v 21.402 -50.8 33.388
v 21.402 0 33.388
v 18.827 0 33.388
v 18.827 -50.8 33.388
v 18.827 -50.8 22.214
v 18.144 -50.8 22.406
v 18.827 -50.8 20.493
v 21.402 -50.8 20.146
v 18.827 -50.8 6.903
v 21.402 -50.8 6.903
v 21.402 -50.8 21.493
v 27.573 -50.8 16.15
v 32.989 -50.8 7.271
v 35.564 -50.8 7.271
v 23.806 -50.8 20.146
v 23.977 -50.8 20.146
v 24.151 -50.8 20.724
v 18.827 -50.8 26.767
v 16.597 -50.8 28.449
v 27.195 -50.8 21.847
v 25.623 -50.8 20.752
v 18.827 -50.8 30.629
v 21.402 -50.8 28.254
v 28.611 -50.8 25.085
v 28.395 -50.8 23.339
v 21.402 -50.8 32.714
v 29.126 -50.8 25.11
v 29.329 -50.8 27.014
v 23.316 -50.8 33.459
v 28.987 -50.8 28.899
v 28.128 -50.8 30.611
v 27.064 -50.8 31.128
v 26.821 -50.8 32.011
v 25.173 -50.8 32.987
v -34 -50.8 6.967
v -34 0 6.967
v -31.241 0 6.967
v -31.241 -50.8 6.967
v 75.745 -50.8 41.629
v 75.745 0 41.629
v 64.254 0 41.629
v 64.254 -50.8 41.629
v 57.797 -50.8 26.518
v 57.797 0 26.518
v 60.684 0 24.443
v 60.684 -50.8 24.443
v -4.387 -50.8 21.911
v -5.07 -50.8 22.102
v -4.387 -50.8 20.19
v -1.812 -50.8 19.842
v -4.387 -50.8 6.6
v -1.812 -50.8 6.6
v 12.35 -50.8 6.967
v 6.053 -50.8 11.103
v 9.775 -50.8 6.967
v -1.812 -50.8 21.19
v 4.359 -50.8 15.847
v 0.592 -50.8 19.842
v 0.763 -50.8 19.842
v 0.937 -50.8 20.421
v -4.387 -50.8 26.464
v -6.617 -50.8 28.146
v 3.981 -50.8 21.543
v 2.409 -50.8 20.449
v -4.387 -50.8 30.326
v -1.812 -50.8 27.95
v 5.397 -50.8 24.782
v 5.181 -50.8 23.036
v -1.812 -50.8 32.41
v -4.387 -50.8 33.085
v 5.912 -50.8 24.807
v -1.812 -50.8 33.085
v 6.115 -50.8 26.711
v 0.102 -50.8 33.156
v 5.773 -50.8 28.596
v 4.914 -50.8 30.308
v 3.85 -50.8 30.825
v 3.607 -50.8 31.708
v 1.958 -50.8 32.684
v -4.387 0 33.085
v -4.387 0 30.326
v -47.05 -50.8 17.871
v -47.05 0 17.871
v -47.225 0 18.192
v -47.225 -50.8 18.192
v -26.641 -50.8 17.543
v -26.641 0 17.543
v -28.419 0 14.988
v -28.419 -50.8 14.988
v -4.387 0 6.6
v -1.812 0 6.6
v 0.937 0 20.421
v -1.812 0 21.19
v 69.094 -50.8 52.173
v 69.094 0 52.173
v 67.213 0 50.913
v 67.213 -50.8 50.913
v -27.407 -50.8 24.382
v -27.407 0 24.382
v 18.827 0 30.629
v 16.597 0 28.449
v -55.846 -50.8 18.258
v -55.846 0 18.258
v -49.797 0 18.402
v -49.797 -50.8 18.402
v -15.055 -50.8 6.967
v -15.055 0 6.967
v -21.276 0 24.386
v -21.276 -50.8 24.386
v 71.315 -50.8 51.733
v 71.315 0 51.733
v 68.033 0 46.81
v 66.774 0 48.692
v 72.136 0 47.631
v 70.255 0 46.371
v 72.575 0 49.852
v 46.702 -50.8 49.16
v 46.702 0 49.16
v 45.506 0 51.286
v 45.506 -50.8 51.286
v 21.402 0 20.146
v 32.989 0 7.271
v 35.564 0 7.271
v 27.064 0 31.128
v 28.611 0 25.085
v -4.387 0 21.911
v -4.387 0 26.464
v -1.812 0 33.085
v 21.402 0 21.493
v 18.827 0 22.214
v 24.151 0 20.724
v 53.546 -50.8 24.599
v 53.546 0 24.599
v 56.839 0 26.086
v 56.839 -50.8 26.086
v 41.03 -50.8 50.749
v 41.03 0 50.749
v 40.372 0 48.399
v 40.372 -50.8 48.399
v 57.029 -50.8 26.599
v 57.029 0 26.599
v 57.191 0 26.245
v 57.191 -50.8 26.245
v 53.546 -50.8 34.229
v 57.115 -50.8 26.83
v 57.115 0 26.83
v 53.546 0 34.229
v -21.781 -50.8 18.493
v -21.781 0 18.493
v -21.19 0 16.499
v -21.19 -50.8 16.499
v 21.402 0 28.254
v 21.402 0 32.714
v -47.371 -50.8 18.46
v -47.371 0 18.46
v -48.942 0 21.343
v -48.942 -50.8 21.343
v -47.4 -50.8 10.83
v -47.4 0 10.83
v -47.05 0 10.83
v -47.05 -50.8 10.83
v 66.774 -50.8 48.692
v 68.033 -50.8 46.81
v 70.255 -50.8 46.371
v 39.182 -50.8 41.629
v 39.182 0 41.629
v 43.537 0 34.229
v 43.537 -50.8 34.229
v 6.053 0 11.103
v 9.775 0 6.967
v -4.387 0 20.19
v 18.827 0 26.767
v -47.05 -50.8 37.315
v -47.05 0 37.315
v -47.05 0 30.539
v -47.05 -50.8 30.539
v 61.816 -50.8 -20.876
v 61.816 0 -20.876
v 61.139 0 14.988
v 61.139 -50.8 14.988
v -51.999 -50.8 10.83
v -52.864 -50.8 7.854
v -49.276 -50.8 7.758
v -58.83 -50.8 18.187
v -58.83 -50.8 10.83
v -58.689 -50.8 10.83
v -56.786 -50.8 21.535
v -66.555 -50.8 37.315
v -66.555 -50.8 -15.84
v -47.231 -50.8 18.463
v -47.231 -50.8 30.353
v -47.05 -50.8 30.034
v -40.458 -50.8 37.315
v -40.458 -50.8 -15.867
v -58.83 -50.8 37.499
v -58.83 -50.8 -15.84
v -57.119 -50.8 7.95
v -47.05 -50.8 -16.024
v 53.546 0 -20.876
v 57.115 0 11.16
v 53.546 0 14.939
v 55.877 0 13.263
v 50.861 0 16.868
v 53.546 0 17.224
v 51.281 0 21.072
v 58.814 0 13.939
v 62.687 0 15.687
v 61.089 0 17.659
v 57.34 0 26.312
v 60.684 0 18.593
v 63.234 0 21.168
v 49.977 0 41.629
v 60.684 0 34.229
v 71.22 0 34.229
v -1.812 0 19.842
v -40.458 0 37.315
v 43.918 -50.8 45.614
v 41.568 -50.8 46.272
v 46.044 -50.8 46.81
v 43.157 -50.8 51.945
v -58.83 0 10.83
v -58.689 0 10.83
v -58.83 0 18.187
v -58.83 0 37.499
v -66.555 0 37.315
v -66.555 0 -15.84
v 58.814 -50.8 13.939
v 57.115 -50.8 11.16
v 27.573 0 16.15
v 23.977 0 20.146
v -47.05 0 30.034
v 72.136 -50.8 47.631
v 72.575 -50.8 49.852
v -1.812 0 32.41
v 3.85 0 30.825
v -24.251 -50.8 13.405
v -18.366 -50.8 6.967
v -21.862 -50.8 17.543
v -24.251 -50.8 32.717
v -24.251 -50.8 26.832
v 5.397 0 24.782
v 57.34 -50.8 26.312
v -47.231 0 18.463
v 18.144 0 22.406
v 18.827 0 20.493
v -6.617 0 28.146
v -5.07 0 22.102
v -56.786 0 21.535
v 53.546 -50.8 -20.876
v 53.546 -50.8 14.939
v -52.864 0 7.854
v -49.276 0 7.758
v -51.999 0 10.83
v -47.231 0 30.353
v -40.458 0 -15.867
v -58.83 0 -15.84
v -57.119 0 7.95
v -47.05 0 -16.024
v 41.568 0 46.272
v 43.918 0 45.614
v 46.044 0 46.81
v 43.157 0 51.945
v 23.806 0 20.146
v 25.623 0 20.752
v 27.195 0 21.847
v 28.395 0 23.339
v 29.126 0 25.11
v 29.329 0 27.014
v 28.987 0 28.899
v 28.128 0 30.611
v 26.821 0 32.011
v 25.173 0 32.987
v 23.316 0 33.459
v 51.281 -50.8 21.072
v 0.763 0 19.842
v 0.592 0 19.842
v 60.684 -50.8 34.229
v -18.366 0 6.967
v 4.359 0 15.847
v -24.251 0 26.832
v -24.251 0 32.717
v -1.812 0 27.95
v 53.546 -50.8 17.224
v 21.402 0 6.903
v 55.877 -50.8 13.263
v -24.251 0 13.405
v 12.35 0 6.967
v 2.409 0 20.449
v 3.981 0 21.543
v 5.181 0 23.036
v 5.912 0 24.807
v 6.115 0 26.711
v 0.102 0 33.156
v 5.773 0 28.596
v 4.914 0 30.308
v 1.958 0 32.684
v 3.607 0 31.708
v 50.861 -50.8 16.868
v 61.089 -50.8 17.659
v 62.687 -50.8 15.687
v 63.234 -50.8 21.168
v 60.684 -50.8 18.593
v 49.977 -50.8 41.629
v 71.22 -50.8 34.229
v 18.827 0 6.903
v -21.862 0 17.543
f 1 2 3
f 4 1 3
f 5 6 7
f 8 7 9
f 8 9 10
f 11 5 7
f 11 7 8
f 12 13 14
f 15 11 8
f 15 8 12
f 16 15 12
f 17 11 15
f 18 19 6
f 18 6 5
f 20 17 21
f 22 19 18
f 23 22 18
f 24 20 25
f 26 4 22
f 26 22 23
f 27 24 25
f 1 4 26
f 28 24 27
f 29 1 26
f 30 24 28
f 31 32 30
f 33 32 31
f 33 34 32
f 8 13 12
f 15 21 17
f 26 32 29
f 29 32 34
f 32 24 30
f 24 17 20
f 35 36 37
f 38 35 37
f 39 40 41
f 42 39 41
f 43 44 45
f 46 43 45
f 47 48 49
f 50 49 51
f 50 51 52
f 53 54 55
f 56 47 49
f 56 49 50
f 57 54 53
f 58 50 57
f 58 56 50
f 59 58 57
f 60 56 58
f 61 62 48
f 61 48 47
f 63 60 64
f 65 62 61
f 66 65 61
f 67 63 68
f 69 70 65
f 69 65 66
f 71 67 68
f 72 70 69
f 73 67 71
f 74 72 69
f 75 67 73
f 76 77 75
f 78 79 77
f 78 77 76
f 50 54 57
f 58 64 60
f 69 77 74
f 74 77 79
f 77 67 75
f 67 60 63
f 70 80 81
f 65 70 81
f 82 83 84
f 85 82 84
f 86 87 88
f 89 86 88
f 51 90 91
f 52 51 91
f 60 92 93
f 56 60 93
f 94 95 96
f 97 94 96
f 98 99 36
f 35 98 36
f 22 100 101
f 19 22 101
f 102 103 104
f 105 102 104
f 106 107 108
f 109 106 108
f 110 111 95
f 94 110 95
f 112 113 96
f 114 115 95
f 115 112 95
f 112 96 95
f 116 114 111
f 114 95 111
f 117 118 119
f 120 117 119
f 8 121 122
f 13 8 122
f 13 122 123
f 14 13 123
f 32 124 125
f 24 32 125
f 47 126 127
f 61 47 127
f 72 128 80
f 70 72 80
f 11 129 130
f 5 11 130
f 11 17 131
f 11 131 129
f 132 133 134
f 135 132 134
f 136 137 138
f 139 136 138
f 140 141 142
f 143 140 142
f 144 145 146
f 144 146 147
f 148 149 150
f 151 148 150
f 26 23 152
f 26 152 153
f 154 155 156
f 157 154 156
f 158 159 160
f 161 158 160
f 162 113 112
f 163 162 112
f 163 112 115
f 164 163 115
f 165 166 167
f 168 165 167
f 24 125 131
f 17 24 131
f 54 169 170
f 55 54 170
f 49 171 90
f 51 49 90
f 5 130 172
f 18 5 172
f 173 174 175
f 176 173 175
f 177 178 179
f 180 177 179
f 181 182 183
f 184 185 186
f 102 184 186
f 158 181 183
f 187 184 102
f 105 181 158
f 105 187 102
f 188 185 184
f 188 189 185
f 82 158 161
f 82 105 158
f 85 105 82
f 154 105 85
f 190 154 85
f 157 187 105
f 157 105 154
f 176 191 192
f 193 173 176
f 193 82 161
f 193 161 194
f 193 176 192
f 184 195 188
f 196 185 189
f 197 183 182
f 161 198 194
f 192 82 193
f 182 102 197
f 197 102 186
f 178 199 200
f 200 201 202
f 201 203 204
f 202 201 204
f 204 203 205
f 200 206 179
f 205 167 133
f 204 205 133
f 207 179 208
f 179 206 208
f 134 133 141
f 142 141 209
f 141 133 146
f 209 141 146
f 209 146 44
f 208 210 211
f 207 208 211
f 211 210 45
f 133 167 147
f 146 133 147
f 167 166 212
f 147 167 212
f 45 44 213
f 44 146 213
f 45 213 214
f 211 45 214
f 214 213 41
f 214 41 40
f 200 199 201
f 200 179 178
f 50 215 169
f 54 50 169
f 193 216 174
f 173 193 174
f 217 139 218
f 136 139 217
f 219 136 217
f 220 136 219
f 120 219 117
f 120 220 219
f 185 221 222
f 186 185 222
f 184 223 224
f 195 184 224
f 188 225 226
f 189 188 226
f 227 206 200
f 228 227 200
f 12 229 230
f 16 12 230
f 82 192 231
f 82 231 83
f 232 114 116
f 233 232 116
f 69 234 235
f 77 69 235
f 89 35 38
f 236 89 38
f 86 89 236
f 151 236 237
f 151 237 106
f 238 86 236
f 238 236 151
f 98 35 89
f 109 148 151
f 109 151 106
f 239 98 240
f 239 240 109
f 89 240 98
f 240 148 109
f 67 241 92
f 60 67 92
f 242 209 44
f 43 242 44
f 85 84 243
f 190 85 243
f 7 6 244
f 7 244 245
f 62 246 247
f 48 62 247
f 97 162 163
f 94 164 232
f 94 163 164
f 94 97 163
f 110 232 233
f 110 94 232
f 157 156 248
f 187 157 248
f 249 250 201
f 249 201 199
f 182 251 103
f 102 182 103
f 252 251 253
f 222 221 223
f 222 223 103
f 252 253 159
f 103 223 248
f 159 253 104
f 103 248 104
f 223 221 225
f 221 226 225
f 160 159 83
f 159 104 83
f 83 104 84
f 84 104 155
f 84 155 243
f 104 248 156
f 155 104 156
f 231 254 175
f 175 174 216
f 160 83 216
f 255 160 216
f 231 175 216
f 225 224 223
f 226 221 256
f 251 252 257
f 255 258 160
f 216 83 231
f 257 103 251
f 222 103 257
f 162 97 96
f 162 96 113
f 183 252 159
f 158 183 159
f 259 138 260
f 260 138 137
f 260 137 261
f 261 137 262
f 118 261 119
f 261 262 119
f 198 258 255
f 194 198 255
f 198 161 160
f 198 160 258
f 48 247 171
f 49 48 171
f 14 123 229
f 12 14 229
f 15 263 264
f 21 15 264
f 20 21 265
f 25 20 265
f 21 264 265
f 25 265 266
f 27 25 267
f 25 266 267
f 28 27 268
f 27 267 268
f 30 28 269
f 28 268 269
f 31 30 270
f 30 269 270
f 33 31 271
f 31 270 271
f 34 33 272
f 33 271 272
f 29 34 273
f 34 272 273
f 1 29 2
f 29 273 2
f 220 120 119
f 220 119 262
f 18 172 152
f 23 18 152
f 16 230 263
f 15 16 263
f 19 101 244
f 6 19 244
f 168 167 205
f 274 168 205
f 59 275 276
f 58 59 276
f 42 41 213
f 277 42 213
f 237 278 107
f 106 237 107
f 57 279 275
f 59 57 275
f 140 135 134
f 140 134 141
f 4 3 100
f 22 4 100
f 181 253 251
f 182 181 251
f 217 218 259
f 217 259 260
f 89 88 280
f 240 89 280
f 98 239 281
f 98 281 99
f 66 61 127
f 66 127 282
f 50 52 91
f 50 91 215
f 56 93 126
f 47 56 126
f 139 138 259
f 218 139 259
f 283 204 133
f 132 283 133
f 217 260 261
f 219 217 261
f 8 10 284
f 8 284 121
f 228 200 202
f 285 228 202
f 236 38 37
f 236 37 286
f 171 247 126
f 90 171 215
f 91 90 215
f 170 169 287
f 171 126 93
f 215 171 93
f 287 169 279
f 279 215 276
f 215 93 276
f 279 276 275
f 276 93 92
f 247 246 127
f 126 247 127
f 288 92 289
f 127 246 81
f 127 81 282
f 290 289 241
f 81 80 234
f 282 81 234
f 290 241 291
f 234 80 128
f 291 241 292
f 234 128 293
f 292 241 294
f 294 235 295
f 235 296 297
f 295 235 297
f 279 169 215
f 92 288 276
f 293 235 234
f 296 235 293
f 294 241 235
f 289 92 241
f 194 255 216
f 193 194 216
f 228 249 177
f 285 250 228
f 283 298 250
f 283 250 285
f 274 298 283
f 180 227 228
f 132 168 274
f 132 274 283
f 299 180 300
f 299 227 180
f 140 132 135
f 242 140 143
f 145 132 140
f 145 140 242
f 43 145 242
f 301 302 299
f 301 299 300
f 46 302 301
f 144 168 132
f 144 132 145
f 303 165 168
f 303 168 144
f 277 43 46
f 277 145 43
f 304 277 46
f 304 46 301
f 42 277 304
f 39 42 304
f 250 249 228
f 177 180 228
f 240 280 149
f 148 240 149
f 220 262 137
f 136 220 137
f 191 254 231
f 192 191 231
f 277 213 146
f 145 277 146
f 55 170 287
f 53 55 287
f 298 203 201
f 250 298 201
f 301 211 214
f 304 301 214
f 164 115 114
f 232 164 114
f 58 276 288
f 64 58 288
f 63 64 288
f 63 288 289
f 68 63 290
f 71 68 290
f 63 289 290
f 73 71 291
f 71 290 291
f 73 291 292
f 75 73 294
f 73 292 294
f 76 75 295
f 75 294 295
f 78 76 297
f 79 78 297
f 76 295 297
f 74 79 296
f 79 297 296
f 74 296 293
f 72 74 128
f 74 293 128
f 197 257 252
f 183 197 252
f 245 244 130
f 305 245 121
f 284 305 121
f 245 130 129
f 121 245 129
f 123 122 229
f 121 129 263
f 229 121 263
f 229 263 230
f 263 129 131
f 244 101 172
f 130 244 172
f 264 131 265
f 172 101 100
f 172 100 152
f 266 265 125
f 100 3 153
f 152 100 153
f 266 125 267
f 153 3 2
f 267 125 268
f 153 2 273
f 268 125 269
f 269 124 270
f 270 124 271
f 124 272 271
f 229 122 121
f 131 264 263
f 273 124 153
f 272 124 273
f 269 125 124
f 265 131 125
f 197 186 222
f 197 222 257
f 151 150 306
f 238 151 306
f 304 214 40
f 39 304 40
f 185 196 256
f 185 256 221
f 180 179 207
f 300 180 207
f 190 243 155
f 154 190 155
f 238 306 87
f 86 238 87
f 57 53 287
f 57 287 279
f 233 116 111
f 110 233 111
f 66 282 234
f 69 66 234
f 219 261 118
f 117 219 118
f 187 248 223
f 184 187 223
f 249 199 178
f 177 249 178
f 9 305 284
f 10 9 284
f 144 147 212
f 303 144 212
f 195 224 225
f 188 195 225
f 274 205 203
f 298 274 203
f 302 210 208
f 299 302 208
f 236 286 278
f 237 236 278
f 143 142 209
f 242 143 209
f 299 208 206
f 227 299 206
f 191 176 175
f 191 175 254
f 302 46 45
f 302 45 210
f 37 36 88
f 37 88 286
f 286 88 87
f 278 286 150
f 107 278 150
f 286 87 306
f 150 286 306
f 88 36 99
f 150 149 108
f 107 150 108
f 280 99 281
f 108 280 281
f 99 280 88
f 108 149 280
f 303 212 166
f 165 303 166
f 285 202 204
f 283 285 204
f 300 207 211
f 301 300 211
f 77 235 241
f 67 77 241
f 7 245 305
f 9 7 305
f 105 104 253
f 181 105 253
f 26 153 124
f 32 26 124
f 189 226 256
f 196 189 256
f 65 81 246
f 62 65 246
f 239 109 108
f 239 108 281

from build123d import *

# Parameters (mm, degrees)
F1_DEPTH = 50.8


with BuildPart() as f1:
    # F0 (on Front) → F1 (new body)
    with BuildSketch(Plane.XZ):
        Polygon((-58.8298365474, 29.786439916), (-66.5548071265, 37.3154692352), (-66.5548071265, 18.4631307041), align=None)
        Polygon((-58.8298365474, 37.4993979931), (-66.5548071265, 37.3154692352), (-58.8298365474, 29.786439916), align=None)
        Polygon((-58.8298365474, 10.8298631385), (-66.5548071265, 18.4631307041), (-66.5548071265, 3.0120878626), align=None)
        Polygon((-58.8298365474, 29.786439916), (-66.5548071265, 18.4631307041), (-58.8298365474, 10.8298631385), (-58.8298365474, 11.0889577304), (-60.8739337508, 14.8388091705), (-58.8298365474, 18.1869771332), align=None)
        Polygon((-58.8298365474, -6.2754247338), (-66.5548071265, 3.0120878626), (-66.5548071265, -15.8396717161), align=None)
        Polygon((-58.8298365474, 10.8298631385), (-66.5548071265, 3.0120878626), (-58.8298365474, -6.2754247338), align=None)
        Polygon((-58.8298365474, 11.0889577304), (-58.8298365474, 10.8298631385), (-58.6886004107, 10.8298631385), align=None)
        Polygon((-55.8463617032, 18.2580125911), (-58.8298365474, 18.1869771332), (-58.8298365474, 11.0889577304), (-58.6886004107, 10.8298631385), (-53.7171107503, 10.8298631385), align=None)
        Polygon((-56.785739344, 21.5351450958), (-58.8298365474, 18.1869771332), (-55.8463617032, 18.2580125911), align=None)
        Polygon((-58.8298365474, 11.0889577304), (-58.8298365474, 18.1869771332), (-60.8739337508, 14.8388091705), align=None)
        Polygon((-58.8298365474, -6.2754247338), (-66.5548071265, -15.8396717161), (-58.8298365474, -15.8396717161), align=None)
        Polygon((-53.7171107503, 10.8298631385), (-58.6886004107, 10.8298631385), (-57.1188339306, 7.9501609961), (-49.2755397037, 7.7578487468), (-47.4000376092, 10.8298631385), (-51.9989120974, 10.8298631385), (-52.8640922305, 7.8540048714), align=None)
        Polygon((-56.785739344, 21.5351450958), (-55.8463617032, 18.2580125911), (-49.7974319066, 18.4020354236), (-48.9424451171, 21.3428328465), align=None)
        Polygon((-48.9424451171, 21.3428328465), (-49.7974319066, 18.4020354236), (-47.3708690241, 18.4598110089), align=None)
        Polygon((-47.3708690241, 18.4598110089), (-49.7974319066, 18.4020354236), (-51.9989120974, 10.8298631385), (-47.4000376092, 10.8298631385), (-47.0628473915, 11.3821702804), (-47.2249917962, 18.1922024371), align=None)
        Polygon((-47.2314425003, 18.4631307041), (-47.3708690241, 18.4598110089), (-47.2249917962, 18.1922024371), align=None)
        Polygon((-47.0628473915, 11.3821702804), (-47.4000376092, 10.8298631385), (-47.049697158, 10.8298631385), align=None)
        Polygon((-47.049697158, 17.8706282721), (-47.2249917962, 18.1922024371), (-47.0628473915, 11.3821702804), (-47.049697158, 11.4037099558), align=None)
        Polygon((-40.4583076052, 5.1381438499), (-47.049697158, 10.8298631385), (-47.049697158, -5.723641254), align=None)
        Polygon((-47.0628473915, 11.3821702804), (-47.049697158, 10.8298631385), (-47.049697158, 11.4037099558), align=None)
        Polygon((-47.049697158, 11.4037099558), (-47.049697158, 10.8298631385), (-40.4583076052, 18.4631307041), (-47.049697158, 30.0335602085), (-47.049697158, 17.8706282721), (-45.187345297, 14.454184672), align=None)
        Polygon((-40.4583076052, 18.4631307041), (-47.049697158, 10.8298631385), (-40.4583076052, 5.1381438499), align=None)
        Polygon((-45.187345297, 14.454184672), (-47.049697158, 17.8706282721), (-47.049697158, 11.4037099558), align=None)
        Polygon((-40.4583076052, -15.866660008), (-47.049697158, -5.723641254), (-47.049697158, -16.0235986114), align=None)
        Polygon((-40.4583076052, 5.1381438499), (-47.049697158, -5.723641254), (-40.4583076052, -15.866660008), align=None)
        Polygon((-47.049697158, 30.0335602085), (-40.4583076052, 18.4631307041), (-40.4583076052, 37.3154692352), (-47.049697158, 30.5394300565), align=None)
        Polygon((-47.2314425003, 30.3525933432), (-47.049697158, 30.0335602085), (-47.049697158, 30.5394300565), align=None)
        Polygon((-47.049697158, 30.5394300565), (-40.4583076052, 37.3154692352), (-47.049697158, 37.3154692352), align=None)
    extrude(amount=F1_DEPTH)


with BuildPart() as f1b:
    # F0 (on Front) → F1, piece 2 (new body)
    with BuildSketch(Plane.XZ):
        Polygon((-24.2514032871, 26.8315859139), (-24.2514032871, 32.7172726393), (-27.4069766335, 24.3817956818), align=None)
        Polygon((-21.2761012771, 24.3864267705), (-24.2514032871, 32.7172726393), (-24.2514032871, 26.8315859139), align=None)
        Polygon((-26.852971582, 19.437654277), (-27.4069766335, 24.3817956818), (-33.9995771646, 6.9673787802), (-28.4185056166, 14.9882413403), align=None)
        Polygon((-24.2514032871, 26.8315859139), (-27.4069766335, 24.3817956818), (-26.852971582, 19.437654277), align=None)
        Polygon((-21.7807631904, 18.4931748057), (-21.2761012771, 24.3864267705), (-24.2514032871, 26.8315859139), align=None)
        Polygon((-15.0550128892, 6.9673787802), (-21.2761012771, 24.3864267705), (-21.7807631904, 18.4931748057), (-21.189810511, 16.4987093259), align=None)
        Polygon((-28.4185056166, 14.9882413403), (-33.9995771646, 6.9673787802), (-31.2406606972, 6.9673787802), align=None)
        Polygon((-18.3657128364, 6.9673787802), (-15.0550128892, 6.9673787802), (-21.189810511, 16.4987093259), align=None)
        Polygon((-28.4185056166, 14.9882413403), (-31.2406606972, 6.9673787802), (-24.2514032871, 13.4048527107), (-26.6406958413, 17.5432288088), align=None)
        Polygon((-21.8621107328, 17.5432288088), (-26.6406958413, 17.5432288088), (-24.2514032871, 13.4048527107), align=None)
        Polygon((-24.2514032871, 13.4048527107), (-18.3657128364, 6.9673787802), (-21.189810511, 16.4987093259), (-21.8621107328, 17.5432288088), align=None)
    extrude(amount=F1_DEPTH)


with BuildPart() as f1c:
    # F0 (on Front) → F1, piece 3 (new body)
    with BuildSketch(Plane.XZ):
        Polygon((-1.8122101901, 33.0851301551), (-4.3871989474, 33.0851301551), (-4.3871989474, 30.326211825), (-2.1571931011, 32.5069151583), (-1.8122101901, 32.4103317998), align=None)
        Polygon((-2.1571931011, 32.5069151583), (-4.3871989474, 30.326211825), (-4.3871989474, 26.4637283981), (-1.8122101901, 27.9503988502), (-1.8122101901, 32.4103317998), align=None)
        Polygon((-4.3871989474, 26.4637283981), (-4.3871989474, 30.326211825), (-6.6172047936, 28.1455084917), (-5.0701216704, 22.1023217315), (-4.3871989474, 21.91112684), align=None)
        with BuildLine():
            ThreePointArc((0.5919902344, 19.8423266411), (6.0112917792, 27.6658286104), (-1.8122101901, 33.0851301551))
            Line((-1.8122101901, 33.0851301551), (-1.8122101901, 32.4103317998))
            Line((-1.8122101901, 32.4103317998), (3.8499017147, 30.8251350647))
            Line((3.8499017147, 30.8251350647), (5.396984838, 24.7819483045))
            Line((5.396984838, 24.7819483045), (0.9369731454, 20.4205416378))
            Line((0.9369731454, 20.4205416378), (-1.8122101901, 21.1902184865))
            Line((-1.8122101901, 21.1902184865), (-1.8122101901, 19.8423266411))
            Line((-1.8122101901, 19.8423266411), (0.5919902344, 19.8423266411))
        make_face()
        with BuildLine():
            Line((0.7627803134, 19.8423266411), (0.5919902344, 19.8423266411))
            ThreePointArc((0.5919902344, 19.8423266411), (-0.6101099778, 19.7340919928), (-1.8122101901, 19.8423266411))
            Line((-1.8122101901, 19.8423266411), (4.3589192338, 15.8466170106))
            Line((4.3589192338, 15.8466170106), (0.7627803134, 19.8423266411))
        make_face()
        with BuildLine():
            ThreePointArc((-1.8122101901, 19.8423266411), (-0.6101099778, 19.7340919928), (0.5919902344, 19.8423266411))
            Line((0.5919902344, 19.8423266411), (-1.8122101901, 19.8423266411))
        make_face()
        Polygon((-1.8122101901, 21.1902184865), (-4.3871989474, 21.91112684), (-4.3871989474, 20.1901380517), (-1.8122101901, 12.9801693227), (-1.8122101901, 19.8423266411), align=None)
        Polygon((-4.3871989474, 20.1901380517), (-4.3871989474, 21.91112684), (-5.0701216704, 22.1023217315), align=None)
        Polygon((4.3589192338, 15.8466170106), (-1.8122101901, 19.8423266411), (6.0529916546, 11.1032140948), align=None)
        Polygon((-1.8122101901, 12.9801693227), (-4.3871989474, 20.1901380517), (-4.3871989474, 6.5995231271), align=None)
        Polygon((-1.8122101901, 6.5995231271), (-1.8122101901, 12.9801693227), (-4.3871989474, 6.5995231271), align=None)
        Polygon((12.350234203, 6.9673787802), (6.0529916546, 11.1032140948), (9.7752436996, 6.9673787802), align=None)
        Polygon((4.3589192338, 15.8466170106), (6.0529916546, 11.1032140948), (12.350234203, 6.9673787802), align=None)
    extrude(amount=F1_DEPTH)


with BuildPart() as f1d:
    # F0 (on Front) → F1, piece 4 (new body)
    with BuildSketch(Plane.XZ):
        Polygon((21.4019286279, 33.388309678), (18.8269398706, 33.388309678), (18.8269398706, 30.6293913479), (21.0569457169, 32.8100946813), (21.4019286279, 32.7135113227), align=None)
        Polygon((21.0569457169, 32.8100946813), (18.8269398706, 30.6293913479), (18.8269398706, 26.766907921), (21.4019286279, 28.2535783732), (21.4019286279, 32.7135113227), align=None)
        Polygon((18.8269398706, 26.766907921), (18.8269398706, 30.6293913479), (16.5969340243, 28.4486880146), (18.1440171476, 22.4055012544), (18.8269398706, 22.214306363), align=None)
        with BuildLine():
            ThreePointArc((23.8061290524, 20.145506164), (29.2254305972, 27.9690081333), (21.4019286279, 33.388309678))
            Line((21.4019286279, 33.388309678), (21.4019286279, 32.7135113227))
            Line((21.4019286279, 32.7135113227), (27.0640405327, 31.1283145876))
            Line((27.0640405327, 31.1283145876), (28.611123656, 25.0851278274))
            Line((28.611123656, 25.0851278274), (24.1511119634, 20.7237211608))
            Line((24.1511119634, 20.7237211608), (21.4019286279, 21.4933980094))
            Line((21.4019286279, 21.4933980094), (21.4019286279, 20.145506164))
            Line((21.4019286279, 20.145506164), (23.8061290524, 20.145506164))
        make_face()
        with BuildLine():
            Line((23.9769191314, 20.145506164), (23.8061290524, 20.145506164))
            ThreePointArc((23.8061290524, 20.145506164), (22.6040288402, 20.0372715157), (21.4019286279, 20.145506164))
            Line((21.4019286279, 20.145506164), (27.5730580518, 16.1497965335))
            Line((27.5730580518, 16.1497965335), (23.9769191314, 20.145506164))
        make_face()
        with BuildLine():
            ThreePointArc((21.4019286279, 20.145506164), (22.6040288402, 20.0372715157), (23.8061290524, 20.145506164))
            Line((23.8061290524, 20.145506164), (21.4019286279, 20.145506164))
        make_face()
        Polygon((21.4019286279, 21.4933980094), (18.8269398706, 22.214306363), (18.8269398706, 20.4933175746), (21.4019286279, 13.2833488456), (21.4019286279, 20.145506164), align=None)
        Polygon((18.8269398706, 20.4933175746), (18.8269398706, 22.214306363), (18.1440171476, 22.4055012544), align=None)
        Polygon((27.5730580518, 16.1497965335), (21.4019286279, 20.145506164), (29.2671304726, 11.4063936178), align=None)
        Polygon((21.4019286279, 13.2833488456), (18.8269398706, 20.4933175746), (18.8269398706, 6.90270265), align=None)
        Polygon((21.4019286279, 6.90270265), (21.4019286279, 13.2833488456), (18.8269398706, 6.90270265), align=None)
        Polygon((35.564373021, 7.2705583032), (29.2671304726, 11.4063936178), (32.9893825175, 7.2705583032), align=None)
        Polygon((27.5730580518, 16.1497965335), (29.2671304726, 11.4063936178), (35.564373021, 7.2705583032), align=None)
    extrude(amount=F1_DEPTH)


with BuildPart() as f1e:
    # F0 (on Front) → F1, piece 5 (new body)
    with BuildSketch(Plane.XZ):
        Polygon((53.5459388047, 34.2291295528), (39.1821190715, 41.6286699474), (43.5372782257, 34.2291295528), align=None)
        Polygon((49.976747483, 41.6286699474), (39.1821190715, 41.6286699474), (53.5459388047, 34.2291295528), align=None)
        Polygon((53.5459388047, 34.2291295528), (43.5372782257, 34.2291295528), (51.2814756196, 21.0715159248), (51.5437088907, 23.6956626177), (53.5459388047, 24.599423428), align=None)
        Polygon((57.1151301265, 26.8295891583), (53.5459388047, 34.2291295528), (57.029432304, 26.5989578941), align=None)
        Polygon((57.029432304, 26.5989578941), (53.5459388047, 34.2291295528), (53.5459388047, 24.599423428), (56.8387197767, 26.0857094825), align=None)
        Polygon((51.5437088907, 23.6956626177), (51.2814756196, 21.0715159248), (53.5459388047, 17.2241279839), (53.5459388047, 24.599423428), align=None)
        Polygon((53.5459388047, 17.2241279839), (51.2814756196, 21.0715159248), (50.8614587952, 16.8684422409), (53.5459388047, 14.9389736363), align=None)
        Polygon((60.6843195856, 34.2291295528), (57.1151301265, 26.8295891583), (57.3395310288, 26.3117642327), (57.797380222, 26.5184268916), (60.6843195856, 24.4434407321), align=None)
        Polygon((57.3395310288, 26.3117642327), (57.1151301265, 26.8295891583), (57.029432304, 26.5989578941), (57.1911297067, 26.2447792685), align=None)
        Polygon((55.8770647699, 13.2634780665), (53.5459388047, 17.2241279839), (53.5459388047, 14.9389736363), align=None)
        Polygon((64.2535090446, 41.6286699474), (60.6843195856, 34.2291295528), (75.744561851, 41.6286699474), align=None)
        Polygon((71.2202719889, 34.2291295528), (60.6843195856, 34.2291295528), (60.6843195856, 24.4434407321), (63.3688014578, 22.5139707888), (63.2342919986, 21.1679457361), align=None)
        Polygon((75.744561851, 41.6286699474), (60.6843195856, 34.2291295528), (71.2202719889, 34.2291295528), align=None)
        Polygon((57.1151301265, 11.1599694937), (55.8770647699, 13.2634780665), (53.5459388047, 14.9389736363), (53.5459388047, -20.8756942302), align=None)
        Polygon((61.1394485812, 14.9884235849), (61.0890615882, 17.6593908996), (58.8142313342, 13.9388736763), align=None)
        Polygon((60.6843195856, 18.5933688616), (61.0890615882, 17.6593908996), (63.2342919986, 21.1679457361), (63.3688014578, 22.5139707888), (60.6843195856, 24.4434407321), align=None)
        Polygon((63.2342919986, 21.1679457361), (61.0890615882, 17.6593908996), (61.1394485812, 14.9884235849), (62.6865513623, 15.686750412), align=None)
        Polygon((57.4633404613, 10.2894352749), (57.1151301265, 11.1599694937), (53.5459388047, -20.8756942302), (61.8160143495, -20.8756942302), align=None)
        Polygon((58.8142313342, 13.9388736763), (57.1151301265, 11.1599694937), (57.4633404613, 10.2894352749), (61.8160143495, -20.8756942302), (61.1394485812, 14.9884235849), align=None)
    extrude(amount=F1_DEPTH)


with BuildPart() as f1f:
    # F0 (on Front) → F1, piece 6 (new body)
    with BuildSketch(Plane.XZ):
        Polygon((43.9176031324, 45.6142562554), (46.0443124175, 46.8102395535), (46.7024350744, 49.1597380108), (45.5064517763, 51.2864472959), (43.1569533189, 51.9445699527), (41.0302440339, 50.7485866547), (40.372121377, 48.3990881973), (41.5681046751, 46.2723789122), align=None)
    extrude(amount=F1_DEPTH)


with BuildPart() as f1g:
    # F0 (on Front) → F1, piece 7 (new body)
    with BuildSketch(Plane.XZ):
        Polygon((70.2545850033, 46.3708363733), (72.1358805895, 47.6307272911), (72.5752800444, 49.8518815691), (71.3153891265, 51.7331771553), (69.0942348486, 52.1725766101), (67.2129392624, 50.9126856923), (66.7735398075, 48.6915314144), (68.0334307253, 46.8102358282), align=None)
    extrude(amount=F1_DEPTH)


solid = Compound([f1.part, f1b.part, f1c.part, f1d.part, f1e.part, f1f.part, f1g.part])
